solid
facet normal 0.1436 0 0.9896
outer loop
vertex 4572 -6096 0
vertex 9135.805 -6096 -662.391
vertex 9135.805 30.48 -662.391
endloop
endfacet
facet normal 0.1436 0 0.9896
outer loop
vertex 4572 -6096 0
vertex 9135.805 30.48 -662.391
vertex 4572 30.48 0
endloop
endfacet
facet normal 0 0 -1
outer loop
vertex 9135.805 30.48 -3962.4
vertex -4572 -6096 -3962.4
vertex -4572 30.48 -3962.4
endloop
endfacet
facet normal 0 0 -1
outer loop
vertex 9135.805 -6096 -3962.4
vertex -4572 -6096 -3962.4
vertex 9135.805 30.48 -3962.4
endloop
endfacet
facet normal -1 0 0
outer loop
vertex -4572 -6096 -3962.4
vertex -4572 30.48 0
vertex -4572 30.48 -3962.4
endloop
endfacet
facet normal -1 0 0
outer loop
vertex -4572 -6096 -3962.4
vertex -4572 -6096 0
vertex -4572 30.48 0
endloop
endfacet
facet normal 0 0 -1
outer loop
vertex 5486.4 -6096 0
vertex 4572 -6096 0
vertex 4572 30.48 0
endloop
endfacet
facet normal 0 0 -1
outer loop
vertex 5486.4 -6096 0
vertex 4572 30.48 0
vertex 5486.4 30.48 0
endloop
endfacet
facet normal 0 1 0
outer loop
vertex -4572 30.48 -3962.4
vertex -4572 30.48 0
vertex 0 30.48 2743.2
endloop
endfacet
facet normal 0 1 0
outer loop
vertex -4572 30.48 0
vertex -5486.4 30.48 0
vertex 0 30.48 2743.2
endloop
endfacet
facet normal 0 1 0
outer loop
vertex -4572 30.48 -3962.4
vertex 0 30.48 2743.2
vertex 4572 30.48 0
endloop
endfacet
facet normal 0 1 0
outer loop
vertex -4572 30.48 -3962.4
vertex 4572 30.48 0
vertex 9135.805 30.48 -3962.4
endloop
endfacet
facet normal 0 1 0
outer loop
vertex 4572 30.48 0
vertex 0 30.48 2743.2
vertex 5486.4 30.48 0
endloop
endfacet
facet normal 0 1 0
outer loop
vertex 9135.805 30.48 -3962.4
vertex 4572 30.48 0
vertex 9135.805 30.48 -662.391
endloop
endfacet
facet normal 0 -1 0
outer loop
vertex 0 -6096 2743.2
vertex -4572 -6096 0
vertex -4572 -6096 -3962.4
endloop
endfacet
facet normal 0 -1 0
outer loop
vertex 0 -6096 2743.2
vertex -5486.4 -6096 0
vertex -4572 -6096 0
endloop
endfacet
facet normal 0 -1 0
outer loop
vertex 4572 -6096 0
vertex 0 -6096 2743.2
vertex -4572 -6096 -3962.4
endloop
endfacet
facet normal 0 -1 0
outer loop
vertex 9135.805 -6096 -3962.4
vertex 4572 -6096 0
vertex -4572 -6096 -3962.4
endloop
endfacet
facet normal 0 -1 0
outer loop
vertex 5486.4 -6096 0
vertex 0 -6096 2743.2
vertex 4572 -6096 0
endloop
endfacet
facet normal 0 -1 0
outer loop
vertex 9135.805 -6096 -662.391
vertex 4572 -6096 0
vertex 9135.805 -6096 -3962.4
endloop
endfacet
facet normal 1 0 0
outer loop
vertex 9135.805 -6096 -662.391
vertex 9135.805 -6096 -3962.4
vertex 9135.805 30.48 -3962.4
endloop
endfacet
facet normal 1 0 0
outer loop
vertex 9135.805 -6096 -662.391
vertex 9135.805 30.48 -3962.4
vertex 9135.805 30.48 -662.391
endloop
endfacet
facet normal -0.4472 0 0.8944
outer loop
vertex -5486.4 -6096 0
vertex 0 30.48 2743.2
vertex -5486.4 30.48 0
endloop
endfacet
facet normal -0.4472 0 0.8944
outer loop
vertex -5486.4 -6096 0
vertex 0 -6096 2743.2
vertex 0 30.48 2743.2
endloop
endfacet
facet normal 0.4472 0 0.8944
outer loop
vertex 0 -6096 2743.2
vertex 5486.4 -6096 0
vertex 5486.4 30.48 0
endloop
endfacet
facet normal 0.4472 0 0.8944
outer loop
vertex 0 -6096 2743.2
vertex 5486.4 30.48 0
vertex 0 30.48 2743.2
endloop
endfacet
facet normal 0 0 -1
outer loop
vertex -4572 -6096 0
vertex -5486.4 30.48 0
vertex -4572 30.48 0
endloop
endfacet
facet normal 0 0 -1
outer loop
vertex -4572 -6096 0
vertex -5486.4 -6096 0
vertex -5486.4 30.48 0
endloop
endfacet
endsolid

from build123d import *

# Parameters (mm, degrees)
F0_W          = 2743.2
F0_H          = 1371.6
F0_W_2        = 1219.2
F0_H_2        = 761.5693855479
F0_W_3        = 4563.8048175471
F0_H_3        = 609.6
F0_W_4        = 914.4
F0_H_4        = 2133.6
F1_DEPTH      = 6096
F1_DEPTH_BACK = 30.48


# Not quite as in the source:
# - the program builds the solid bodies; features that only make, move or delete a surface that nothing else refers to are left out


with BuildPart() as f1:
    # F0 (on Front) → F1 (new body, two sides)
    with BuildSketch(Plane.XZ) as f1_sk:
        Polygon((4572, 0), (0, 0), (-4572, 0), (-4572, -3352.8), (-3352.8, -3352.8), (-3352.8, -1219.2), (-2438.4, -1219.2), (-2438.4, -3352.8), (4572, -3352.8), (4572, -401.1528193951), align=None)
        with Locations((1981.2, -1359.7689430237)):
            Rectangle(F0_W, F0_H, mode=Mode.SUBTRACT)
        Polygon((9135.8048175471, -1063.5435686586), (4572, -401.1528193951), (4572, -3352.8), (9135.8048175471, -3352.8), align=None)
        with Locations((6349.5722342422, -2210.4459216781)):
            Rectangle(F0_W_2, F0_H_2, mode=Mode.SUBTRACT)
        Polygon((-3352.8, -3352.8), (-4572, -3352.8), (-4572, -3962.4), (4572, -3962.4), (4572, -3352.8), (-2438.4, -3352.8), align=None)
        Polygon((-4572, 0), (0, 0), (0, 2286), align=None)
        Polygon((0, 2286), (0, 0), (4572, 0), align=None)
        with Locations((1981.2, -1359.7689430237)):
            Rectangle(F0_W, F0_H)
        with Locations((6853.9024087735, -3657.6)):
            Rectangle(F0_W_3, F0_H_3)
        Polygon((-5486.4, 0), (-4572, 0), (0, 2286), (0, 2743.2), align=None)
        Polygon((0, 2286), (4572, 0), (5486.4, 0), (0, 2743.2), align=None)
        with Locations((-2895.6, -2286)):
            Rectangle(F0_W_4, F0_H_4)
        Polygon((9135.8048175471, -662.3907492636), (4572, 0), (4572, -401.1528193951), (9135.8048175471, -1063.5435686586), align=None)
        with Locations((6349.5722342422, -2210.4459216781)):
            Rectangle(F0_W_2, F0_H_2)
    extrude(amount=F1_DEPTH)
    extrude(f1_sk.sketch, amount=-F1_DEPTH_BACK)


solid = f1.part
